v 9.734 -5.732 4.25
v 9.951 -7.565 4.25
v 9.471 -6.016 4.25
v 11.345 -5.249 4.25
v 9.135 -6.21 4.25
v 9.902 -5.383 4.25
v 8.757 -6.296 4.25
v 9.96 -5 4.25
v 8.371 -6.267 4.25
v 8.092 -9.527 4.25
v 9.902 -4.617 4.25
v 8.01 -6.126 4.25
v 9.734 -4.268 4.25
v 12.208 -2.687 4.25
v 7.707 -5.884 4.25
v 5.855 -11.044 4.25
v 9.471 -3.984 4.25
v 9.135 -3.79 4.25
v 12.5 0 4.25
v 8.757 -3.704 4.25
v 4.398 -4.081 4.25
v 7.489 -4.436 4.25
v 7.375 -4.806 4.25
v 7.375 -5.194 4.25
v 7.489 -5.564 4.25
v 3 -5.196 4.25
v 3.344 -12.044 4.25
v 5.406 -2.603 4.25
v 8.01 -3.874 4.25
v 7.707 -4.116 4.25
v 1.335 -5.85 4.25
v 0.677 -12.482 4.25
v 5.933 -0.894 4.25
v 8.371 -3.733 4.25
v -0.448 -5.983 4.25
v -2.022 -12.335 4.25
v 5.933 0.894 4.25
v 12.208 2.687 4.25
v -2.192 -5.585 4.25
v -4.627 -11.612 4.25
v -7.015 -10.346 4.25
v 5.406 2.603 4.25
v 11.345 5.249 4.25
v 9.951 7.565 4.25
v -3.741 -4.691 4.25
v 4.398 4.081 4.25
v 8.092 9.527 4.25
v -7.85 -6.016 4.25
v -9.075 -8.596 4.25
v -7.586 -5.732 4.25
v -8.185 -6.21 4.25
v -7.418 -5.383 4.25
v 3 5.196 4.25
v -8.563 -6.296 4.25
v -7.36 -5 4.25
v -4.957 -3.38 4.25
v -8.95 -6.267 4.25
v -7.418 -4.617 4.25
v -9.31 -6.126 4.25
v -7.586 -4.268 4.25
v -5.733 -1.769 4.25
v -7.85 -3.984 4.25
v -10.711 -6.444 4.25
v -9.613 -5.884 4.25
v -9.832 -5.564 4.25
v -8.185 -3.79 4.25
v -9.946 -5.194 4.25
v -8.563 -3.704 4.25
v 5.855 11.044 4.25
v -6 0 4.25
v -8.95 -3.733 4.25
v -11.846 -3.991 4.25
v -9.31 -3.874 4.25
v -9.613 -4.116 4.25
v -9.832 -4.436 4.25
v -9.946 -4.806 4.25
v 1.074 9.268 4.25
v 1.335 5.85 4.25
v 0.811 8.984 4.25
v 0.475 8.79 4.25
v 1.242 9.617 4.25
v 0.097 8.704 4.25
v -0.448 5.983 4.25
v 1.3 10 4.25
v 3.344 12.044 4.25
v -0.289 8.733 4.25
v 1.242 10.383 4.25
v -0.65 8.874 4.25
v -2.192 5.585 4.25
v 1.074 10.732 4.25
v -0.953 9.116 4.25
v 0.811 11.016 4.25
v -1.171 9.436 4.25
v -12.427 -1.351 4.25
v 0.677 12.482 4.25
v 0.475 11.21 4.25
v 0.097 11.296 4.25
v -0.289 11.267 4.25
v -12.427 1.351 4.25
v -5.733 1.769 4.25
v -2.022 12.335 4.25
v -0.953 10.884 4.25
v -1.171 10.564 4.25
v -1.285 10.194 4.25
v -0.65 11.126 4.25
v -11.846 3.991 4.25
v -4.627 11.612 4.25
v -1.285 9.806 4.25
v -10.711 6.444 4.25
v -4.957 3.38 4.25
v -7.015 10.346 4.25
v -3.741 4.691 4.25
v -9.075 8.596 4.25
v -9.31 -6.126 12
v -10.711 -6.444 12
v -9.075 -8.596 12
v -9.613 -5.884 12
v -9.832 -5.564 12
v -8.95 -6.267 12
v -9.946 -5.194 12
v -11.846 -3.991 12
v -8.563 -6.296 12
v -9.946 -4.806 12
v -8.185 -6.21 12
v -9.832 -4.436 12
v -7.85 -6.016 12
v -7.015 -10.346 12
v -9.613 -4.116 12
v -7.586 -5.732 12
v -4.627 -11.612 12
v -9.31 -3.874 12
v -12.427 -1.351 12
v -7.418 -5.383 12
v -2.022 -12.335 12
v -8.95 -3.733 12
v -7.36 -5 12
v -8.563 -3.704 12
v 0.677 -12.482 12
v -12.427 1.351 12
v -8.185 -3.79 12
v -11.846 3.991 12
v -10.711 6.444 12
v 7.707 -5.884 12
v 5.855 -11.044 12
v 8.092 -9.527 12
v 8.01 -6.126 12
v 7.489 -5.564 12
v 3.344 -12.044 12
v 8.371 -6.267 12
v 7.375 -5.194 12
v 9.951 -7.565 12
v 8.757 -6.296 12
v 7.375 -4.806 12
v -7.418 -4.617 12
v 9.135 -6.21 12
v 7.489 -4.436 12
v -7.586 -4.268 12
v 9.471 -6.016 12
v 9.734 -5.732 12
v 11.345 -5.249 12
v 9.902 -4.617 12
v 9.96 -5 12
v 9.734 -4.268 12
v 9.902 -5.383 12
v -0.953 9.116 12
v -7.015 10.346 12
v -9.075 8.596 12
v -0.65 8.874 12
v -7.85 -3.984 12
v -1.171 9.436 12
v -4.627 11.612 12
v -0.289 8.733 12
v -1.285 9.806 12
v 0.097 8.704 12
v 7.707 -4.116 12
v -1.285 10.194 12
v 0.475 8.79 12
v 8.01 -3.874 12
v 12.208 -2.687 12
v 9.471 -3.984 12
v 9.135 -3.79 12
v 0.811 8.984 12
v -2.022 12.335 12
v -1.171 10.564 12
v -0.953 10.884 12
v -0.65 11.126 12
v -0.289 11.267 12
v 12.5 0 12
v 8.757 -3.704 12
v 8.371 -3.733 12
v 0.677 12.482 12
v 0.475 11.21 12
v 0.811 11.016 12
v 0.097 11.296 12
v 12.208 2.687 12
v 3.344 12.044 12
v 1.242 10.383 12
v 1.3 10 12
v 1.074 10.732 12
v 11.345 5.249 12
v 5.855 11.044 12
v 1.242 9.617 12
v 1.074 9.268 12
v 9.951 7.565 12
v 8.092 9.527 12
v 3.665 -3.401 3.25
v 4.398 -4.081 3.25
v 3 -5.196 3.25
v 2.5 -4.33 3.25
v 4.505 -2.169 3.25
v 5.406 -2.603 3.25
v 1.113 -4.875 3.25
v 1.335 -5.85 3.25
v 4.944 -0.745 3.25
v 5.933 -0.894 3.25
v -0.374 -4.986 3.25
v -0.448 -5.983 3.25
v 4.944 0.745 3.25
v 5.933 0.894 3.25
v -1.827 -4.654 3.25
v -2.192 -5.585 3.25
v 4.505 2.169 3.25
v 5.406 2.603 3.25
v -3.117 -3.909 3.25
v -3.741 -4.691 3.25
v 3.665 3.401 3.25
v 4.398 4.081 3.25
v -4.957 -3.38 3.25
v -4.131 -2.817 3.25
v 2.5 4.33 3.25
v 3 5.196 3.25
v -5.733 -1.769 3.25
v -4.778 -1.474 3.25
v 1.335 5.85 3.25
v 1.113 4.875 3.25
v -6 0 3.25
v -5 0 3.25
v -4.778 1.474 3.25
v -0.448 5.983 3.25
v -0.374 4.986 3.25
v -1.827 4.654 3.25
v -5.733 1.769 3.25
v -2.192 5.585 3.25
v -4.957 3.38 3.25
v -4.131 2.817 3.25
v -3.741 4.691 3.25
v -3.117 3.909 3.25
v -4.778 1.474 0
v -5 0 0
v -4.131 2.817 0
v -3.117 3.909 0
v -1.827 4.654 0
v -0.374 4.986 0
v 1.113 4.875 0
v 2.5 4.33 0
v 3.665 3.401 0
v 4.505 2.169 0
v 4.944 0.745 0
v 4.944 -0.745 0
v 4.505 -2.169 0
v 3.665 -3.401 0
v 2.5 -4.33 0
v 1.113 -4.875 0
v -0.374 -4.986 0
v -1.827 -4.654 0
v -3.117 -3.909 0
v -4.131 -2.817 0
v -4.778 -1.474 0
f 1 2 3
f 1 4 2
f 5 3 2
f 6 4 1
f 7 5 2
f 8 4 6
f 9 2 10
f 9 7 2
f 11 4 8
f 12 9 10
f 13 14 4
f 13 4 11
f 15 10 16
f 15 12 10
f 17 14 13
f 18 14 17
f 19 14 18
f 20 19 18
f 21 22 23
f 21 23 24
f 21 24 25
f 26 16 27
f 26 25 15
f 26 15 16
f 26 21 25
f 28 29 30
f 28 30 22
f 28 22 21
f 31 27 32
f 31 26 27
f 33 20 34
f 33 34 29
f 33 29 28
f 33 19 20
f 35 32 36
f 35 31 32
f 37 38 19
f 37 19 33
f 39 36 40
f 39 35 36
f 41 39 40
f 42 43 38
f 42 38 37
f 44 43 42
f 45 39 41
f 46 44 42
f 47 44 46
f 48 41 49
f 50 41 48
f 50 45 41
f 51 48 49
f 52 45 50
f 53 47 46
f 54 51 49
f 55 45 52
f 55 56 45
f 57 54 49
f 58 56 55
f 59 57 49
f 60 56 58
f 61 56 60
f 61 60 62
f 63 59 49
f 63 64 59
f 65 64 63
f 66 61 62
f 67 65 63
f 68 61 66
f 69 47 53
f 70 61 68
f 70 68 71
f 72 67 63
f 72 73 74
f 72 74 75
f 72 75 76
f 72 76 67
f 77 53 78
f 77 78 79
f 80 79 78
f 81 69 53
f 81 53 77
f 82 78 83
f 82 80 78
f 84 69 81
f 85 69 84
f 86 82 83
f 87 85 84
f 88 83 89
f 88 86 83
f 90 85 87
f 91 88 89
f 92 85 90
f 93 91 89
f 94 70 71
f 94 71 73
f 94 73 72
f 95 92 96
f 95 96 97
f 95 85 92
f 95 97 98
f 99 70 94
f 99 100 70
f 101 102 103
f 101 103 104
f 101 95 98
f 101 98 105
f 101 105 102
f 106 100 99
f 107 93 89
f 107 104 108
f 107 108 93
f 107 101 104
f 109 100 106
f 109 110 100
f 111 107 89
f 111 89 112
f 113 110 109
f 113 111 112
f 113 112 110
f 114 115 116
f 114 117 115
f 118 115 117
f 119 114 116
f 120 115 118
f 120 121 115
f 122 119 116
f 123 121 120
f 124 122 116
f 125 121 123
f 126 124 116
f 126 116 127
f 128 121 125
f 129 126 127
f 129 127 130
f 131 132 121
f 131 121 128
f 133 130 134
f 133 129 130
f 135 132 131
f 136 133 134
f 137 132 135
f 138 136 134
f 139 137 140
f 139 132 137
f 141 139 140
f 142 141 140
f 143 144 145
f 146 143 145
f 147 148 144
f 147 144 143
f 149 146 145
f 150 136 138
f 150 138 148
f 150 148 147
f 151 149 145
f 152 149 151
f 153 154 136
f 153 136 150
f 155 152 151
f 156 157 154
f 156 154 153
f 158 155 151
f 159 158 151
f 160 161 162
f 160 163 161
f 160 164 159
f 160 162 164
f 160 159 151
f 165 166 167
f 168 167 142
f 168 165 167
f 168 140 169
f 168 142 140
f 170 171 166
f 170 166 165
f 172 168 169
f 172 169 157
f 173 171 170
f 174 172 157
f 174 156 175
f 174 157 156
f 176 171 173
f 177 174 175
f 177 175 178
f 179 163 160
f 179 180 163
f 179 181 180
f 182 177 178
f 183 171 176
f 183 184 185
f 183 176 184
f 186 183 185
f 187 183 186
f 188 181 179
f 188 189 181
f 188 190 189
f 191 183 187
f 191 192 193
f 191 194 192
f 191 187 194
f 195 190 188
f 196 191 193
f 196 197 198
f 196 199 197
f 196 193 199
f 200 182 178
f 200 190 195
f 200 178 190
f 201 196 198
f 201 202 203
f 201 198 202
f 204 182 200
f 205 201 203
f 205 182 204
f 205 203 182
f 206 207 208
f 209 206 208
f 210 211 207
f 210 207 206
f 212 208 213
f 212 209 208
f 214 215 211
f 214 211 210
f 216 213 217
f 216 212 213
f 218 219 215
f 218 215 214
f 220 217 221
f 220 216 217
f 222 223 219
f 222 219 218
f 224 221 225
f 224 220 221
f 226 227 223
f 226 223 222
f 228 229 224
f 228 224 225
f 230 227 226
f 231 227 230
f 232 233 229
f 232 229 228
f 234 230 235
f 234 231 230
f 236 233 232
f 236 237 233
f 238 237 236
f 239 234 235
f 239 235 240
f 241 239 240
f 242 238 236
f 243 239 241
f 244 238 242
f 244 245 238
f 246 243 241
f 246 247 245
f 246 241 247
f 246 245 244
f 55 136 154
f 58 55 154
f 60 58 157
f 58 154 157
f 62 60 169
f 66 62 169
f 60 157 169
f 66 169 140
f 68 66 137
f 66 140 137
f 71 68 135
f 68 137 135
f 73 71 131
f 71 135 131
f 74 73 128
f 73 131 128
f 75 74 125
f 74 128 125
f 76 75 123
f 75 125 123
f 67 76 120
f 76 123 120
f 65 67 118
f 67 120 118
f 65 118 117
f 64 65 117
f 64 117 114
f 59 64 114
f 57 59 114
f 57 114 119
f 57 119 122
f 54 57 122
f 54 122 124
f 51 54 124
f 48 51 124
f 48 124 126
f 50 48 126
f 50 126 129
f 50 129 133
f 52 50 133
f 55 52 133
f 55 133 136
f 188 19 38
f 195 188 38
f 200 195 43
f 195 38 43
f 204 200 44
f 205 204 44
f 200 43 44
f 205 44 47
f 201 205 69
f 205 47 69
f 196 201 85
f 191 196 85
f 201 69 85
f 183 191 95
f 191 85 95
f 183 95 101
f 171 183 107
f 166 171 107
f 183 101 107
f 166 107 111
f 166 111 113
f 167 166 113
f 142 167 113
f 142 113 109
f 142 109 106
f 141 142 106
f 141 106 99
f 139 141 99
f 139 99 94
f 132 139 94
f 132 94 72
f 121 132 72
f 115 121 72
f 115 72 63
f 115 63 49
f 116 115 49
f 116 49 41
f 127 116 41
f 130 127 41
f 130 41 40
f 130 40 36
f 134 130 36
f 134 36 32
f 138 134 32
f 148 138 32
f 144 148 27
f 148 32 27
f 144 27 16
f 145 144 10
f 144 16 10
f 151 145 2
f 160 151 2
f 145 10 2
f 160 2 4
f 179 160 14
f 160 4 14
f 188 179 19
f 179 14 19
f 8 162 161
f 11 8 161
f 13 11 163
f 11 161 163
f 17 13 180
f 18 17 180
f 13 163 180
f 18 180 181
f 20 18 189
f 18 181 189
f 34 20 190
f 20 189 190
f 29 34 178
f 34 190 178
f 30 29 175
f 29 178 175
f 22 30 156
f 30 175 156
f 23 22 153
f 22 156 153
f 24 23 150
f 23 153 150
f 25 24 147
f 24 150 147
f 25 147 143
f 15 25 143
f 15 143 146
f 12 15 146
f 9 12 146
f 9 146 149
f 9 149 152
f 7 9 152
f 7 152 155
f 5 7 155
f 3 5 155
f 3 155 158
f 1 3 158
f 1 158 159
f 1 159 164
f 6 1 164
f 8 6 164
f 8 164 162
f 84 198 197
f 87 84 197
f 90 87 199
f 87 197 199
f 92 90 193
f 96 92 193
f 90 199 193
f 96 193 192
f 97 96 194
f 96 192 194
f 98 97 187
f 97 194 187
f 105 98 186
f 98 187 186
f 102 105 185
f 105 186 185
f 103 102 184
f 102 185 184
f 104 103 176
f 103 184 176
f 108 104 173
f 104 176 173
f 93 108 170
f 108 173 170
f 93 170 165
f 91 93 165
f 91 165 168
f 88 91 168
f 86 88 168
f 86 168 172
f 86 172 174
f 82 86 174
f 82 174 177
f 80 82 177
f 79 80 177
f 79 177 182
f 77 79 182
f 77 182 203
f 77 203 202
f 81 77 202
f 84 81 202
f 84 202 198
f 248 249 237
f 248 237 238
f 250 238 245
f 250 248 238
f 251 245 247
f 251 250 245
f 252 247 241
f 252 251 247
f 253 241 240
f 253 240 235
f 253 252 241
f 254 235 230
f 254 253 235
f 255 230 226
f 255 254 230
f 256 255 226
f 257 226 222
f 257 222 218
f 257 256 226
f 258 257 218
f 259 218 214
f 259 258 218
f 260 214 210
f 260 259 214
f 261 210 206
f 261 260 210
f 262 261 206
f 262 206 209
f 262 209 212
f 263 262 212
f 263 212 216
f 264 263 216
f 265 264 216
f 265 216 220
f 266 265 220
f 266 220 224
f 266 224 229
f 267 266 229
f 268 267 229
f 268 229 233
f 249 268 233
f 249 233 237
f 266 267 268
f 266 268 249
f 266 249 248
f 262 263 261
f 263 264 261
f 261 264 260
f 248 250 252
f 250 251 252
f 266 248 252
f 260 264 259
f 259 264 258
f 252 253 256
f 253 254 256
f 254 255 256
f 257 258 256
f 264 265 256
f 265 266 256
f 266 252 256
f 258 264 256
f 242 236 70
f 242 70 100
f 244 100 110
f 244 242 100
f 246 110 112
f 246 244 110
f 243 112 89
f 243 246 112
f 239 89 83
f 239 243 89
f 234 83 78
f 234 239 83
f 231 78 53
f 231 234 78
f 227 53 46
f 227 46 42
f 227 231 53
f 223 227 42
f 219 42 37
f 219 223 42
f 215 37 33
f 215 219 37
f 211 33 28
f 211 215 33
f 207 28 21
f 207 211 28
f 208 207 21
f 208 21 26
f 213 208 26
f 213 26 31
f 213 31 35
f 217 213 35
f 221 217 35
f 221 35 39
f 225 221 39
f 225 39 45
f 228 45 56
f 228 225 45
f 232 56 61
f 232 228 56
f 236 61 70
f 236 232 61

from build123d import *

# Parameters (mm, degrees)
SKETCH_1_R          = 12.5
EXTRUDE_1_DEPTH     = 12
SKETCH_2_R          = 1.3
CUT_EXTRUDE_1_DEPTH = 22.365860619
SKETCH_3_R          = 12.5
SKETCH_3_R_2        = 5
CUT_EXTRUDE_2_DEPTH = 4.25
EXTRUDE_START       = 1
SKETCH_4_R          = 6
SKETCH_4_R_2        = 5
EXTRUDE_2_DEPTH     = 1


with BuildPart() as part:
    # ｽｹｯﾁ1 → ﾎﾞｽ - 押し出し1 (new body)
    with BuildSketch(Plane.XY):
        Circle(SKETCH_1_R)
    extrude(amount=EXTRUDE_1_DEPTH)

    # ｽｹｯﾁ2 → ｶｯﾄ - 押し出し1 (cut, through all)
    with BuildSketch(Plane.XY.offset(12)):
        with Locations((0, 10)):
            Circle(SKETCH_2_R)
        with Locations((8.660254038, -5)):
            Circle(SKETCH_2_R)
        with Locations((-8.660254038, -5)):
            Circle(SKETCH_2_R)
    extrude(amount=-CUT_EXTRUDE_1_DEPTH, mode=Mode.SUBTRACT)

    # ｽｹｯﾁ3 → ｶｯﾄ - 押し出し2 (cut)
    with BuildSketch(Plane(origin=(0, 0, 0), x_dir=(-1, 0, 0), z_dir=(0, 0, -1))):
        Circle(SKETCH_3_R)
        Circle(SKETCH_3_R_2, mode=Mode.SUBTRACT)
    extrude(amount=-CUT_EXTRUDE_2_DEPTH, mode=Mode.SUBTRACT)

    # ｽｹｯﾁ4 → ﾎﾞｽ - 押し出し2 (add)
    with BuildSketch(Plane(origin=(0, 0, 4.25), x_dir=(-1, 0, 0), z_dir=(0, 0, -1)).offset(EXTRUDE_START)):
        Circle(SKETCH_4_R)
        Circle(SKETCH_4_R_2, mode=Mode.SUBTRACT)
    extrude(amount=-EXTRUDE_2_DEPTH)


solid = part.part
